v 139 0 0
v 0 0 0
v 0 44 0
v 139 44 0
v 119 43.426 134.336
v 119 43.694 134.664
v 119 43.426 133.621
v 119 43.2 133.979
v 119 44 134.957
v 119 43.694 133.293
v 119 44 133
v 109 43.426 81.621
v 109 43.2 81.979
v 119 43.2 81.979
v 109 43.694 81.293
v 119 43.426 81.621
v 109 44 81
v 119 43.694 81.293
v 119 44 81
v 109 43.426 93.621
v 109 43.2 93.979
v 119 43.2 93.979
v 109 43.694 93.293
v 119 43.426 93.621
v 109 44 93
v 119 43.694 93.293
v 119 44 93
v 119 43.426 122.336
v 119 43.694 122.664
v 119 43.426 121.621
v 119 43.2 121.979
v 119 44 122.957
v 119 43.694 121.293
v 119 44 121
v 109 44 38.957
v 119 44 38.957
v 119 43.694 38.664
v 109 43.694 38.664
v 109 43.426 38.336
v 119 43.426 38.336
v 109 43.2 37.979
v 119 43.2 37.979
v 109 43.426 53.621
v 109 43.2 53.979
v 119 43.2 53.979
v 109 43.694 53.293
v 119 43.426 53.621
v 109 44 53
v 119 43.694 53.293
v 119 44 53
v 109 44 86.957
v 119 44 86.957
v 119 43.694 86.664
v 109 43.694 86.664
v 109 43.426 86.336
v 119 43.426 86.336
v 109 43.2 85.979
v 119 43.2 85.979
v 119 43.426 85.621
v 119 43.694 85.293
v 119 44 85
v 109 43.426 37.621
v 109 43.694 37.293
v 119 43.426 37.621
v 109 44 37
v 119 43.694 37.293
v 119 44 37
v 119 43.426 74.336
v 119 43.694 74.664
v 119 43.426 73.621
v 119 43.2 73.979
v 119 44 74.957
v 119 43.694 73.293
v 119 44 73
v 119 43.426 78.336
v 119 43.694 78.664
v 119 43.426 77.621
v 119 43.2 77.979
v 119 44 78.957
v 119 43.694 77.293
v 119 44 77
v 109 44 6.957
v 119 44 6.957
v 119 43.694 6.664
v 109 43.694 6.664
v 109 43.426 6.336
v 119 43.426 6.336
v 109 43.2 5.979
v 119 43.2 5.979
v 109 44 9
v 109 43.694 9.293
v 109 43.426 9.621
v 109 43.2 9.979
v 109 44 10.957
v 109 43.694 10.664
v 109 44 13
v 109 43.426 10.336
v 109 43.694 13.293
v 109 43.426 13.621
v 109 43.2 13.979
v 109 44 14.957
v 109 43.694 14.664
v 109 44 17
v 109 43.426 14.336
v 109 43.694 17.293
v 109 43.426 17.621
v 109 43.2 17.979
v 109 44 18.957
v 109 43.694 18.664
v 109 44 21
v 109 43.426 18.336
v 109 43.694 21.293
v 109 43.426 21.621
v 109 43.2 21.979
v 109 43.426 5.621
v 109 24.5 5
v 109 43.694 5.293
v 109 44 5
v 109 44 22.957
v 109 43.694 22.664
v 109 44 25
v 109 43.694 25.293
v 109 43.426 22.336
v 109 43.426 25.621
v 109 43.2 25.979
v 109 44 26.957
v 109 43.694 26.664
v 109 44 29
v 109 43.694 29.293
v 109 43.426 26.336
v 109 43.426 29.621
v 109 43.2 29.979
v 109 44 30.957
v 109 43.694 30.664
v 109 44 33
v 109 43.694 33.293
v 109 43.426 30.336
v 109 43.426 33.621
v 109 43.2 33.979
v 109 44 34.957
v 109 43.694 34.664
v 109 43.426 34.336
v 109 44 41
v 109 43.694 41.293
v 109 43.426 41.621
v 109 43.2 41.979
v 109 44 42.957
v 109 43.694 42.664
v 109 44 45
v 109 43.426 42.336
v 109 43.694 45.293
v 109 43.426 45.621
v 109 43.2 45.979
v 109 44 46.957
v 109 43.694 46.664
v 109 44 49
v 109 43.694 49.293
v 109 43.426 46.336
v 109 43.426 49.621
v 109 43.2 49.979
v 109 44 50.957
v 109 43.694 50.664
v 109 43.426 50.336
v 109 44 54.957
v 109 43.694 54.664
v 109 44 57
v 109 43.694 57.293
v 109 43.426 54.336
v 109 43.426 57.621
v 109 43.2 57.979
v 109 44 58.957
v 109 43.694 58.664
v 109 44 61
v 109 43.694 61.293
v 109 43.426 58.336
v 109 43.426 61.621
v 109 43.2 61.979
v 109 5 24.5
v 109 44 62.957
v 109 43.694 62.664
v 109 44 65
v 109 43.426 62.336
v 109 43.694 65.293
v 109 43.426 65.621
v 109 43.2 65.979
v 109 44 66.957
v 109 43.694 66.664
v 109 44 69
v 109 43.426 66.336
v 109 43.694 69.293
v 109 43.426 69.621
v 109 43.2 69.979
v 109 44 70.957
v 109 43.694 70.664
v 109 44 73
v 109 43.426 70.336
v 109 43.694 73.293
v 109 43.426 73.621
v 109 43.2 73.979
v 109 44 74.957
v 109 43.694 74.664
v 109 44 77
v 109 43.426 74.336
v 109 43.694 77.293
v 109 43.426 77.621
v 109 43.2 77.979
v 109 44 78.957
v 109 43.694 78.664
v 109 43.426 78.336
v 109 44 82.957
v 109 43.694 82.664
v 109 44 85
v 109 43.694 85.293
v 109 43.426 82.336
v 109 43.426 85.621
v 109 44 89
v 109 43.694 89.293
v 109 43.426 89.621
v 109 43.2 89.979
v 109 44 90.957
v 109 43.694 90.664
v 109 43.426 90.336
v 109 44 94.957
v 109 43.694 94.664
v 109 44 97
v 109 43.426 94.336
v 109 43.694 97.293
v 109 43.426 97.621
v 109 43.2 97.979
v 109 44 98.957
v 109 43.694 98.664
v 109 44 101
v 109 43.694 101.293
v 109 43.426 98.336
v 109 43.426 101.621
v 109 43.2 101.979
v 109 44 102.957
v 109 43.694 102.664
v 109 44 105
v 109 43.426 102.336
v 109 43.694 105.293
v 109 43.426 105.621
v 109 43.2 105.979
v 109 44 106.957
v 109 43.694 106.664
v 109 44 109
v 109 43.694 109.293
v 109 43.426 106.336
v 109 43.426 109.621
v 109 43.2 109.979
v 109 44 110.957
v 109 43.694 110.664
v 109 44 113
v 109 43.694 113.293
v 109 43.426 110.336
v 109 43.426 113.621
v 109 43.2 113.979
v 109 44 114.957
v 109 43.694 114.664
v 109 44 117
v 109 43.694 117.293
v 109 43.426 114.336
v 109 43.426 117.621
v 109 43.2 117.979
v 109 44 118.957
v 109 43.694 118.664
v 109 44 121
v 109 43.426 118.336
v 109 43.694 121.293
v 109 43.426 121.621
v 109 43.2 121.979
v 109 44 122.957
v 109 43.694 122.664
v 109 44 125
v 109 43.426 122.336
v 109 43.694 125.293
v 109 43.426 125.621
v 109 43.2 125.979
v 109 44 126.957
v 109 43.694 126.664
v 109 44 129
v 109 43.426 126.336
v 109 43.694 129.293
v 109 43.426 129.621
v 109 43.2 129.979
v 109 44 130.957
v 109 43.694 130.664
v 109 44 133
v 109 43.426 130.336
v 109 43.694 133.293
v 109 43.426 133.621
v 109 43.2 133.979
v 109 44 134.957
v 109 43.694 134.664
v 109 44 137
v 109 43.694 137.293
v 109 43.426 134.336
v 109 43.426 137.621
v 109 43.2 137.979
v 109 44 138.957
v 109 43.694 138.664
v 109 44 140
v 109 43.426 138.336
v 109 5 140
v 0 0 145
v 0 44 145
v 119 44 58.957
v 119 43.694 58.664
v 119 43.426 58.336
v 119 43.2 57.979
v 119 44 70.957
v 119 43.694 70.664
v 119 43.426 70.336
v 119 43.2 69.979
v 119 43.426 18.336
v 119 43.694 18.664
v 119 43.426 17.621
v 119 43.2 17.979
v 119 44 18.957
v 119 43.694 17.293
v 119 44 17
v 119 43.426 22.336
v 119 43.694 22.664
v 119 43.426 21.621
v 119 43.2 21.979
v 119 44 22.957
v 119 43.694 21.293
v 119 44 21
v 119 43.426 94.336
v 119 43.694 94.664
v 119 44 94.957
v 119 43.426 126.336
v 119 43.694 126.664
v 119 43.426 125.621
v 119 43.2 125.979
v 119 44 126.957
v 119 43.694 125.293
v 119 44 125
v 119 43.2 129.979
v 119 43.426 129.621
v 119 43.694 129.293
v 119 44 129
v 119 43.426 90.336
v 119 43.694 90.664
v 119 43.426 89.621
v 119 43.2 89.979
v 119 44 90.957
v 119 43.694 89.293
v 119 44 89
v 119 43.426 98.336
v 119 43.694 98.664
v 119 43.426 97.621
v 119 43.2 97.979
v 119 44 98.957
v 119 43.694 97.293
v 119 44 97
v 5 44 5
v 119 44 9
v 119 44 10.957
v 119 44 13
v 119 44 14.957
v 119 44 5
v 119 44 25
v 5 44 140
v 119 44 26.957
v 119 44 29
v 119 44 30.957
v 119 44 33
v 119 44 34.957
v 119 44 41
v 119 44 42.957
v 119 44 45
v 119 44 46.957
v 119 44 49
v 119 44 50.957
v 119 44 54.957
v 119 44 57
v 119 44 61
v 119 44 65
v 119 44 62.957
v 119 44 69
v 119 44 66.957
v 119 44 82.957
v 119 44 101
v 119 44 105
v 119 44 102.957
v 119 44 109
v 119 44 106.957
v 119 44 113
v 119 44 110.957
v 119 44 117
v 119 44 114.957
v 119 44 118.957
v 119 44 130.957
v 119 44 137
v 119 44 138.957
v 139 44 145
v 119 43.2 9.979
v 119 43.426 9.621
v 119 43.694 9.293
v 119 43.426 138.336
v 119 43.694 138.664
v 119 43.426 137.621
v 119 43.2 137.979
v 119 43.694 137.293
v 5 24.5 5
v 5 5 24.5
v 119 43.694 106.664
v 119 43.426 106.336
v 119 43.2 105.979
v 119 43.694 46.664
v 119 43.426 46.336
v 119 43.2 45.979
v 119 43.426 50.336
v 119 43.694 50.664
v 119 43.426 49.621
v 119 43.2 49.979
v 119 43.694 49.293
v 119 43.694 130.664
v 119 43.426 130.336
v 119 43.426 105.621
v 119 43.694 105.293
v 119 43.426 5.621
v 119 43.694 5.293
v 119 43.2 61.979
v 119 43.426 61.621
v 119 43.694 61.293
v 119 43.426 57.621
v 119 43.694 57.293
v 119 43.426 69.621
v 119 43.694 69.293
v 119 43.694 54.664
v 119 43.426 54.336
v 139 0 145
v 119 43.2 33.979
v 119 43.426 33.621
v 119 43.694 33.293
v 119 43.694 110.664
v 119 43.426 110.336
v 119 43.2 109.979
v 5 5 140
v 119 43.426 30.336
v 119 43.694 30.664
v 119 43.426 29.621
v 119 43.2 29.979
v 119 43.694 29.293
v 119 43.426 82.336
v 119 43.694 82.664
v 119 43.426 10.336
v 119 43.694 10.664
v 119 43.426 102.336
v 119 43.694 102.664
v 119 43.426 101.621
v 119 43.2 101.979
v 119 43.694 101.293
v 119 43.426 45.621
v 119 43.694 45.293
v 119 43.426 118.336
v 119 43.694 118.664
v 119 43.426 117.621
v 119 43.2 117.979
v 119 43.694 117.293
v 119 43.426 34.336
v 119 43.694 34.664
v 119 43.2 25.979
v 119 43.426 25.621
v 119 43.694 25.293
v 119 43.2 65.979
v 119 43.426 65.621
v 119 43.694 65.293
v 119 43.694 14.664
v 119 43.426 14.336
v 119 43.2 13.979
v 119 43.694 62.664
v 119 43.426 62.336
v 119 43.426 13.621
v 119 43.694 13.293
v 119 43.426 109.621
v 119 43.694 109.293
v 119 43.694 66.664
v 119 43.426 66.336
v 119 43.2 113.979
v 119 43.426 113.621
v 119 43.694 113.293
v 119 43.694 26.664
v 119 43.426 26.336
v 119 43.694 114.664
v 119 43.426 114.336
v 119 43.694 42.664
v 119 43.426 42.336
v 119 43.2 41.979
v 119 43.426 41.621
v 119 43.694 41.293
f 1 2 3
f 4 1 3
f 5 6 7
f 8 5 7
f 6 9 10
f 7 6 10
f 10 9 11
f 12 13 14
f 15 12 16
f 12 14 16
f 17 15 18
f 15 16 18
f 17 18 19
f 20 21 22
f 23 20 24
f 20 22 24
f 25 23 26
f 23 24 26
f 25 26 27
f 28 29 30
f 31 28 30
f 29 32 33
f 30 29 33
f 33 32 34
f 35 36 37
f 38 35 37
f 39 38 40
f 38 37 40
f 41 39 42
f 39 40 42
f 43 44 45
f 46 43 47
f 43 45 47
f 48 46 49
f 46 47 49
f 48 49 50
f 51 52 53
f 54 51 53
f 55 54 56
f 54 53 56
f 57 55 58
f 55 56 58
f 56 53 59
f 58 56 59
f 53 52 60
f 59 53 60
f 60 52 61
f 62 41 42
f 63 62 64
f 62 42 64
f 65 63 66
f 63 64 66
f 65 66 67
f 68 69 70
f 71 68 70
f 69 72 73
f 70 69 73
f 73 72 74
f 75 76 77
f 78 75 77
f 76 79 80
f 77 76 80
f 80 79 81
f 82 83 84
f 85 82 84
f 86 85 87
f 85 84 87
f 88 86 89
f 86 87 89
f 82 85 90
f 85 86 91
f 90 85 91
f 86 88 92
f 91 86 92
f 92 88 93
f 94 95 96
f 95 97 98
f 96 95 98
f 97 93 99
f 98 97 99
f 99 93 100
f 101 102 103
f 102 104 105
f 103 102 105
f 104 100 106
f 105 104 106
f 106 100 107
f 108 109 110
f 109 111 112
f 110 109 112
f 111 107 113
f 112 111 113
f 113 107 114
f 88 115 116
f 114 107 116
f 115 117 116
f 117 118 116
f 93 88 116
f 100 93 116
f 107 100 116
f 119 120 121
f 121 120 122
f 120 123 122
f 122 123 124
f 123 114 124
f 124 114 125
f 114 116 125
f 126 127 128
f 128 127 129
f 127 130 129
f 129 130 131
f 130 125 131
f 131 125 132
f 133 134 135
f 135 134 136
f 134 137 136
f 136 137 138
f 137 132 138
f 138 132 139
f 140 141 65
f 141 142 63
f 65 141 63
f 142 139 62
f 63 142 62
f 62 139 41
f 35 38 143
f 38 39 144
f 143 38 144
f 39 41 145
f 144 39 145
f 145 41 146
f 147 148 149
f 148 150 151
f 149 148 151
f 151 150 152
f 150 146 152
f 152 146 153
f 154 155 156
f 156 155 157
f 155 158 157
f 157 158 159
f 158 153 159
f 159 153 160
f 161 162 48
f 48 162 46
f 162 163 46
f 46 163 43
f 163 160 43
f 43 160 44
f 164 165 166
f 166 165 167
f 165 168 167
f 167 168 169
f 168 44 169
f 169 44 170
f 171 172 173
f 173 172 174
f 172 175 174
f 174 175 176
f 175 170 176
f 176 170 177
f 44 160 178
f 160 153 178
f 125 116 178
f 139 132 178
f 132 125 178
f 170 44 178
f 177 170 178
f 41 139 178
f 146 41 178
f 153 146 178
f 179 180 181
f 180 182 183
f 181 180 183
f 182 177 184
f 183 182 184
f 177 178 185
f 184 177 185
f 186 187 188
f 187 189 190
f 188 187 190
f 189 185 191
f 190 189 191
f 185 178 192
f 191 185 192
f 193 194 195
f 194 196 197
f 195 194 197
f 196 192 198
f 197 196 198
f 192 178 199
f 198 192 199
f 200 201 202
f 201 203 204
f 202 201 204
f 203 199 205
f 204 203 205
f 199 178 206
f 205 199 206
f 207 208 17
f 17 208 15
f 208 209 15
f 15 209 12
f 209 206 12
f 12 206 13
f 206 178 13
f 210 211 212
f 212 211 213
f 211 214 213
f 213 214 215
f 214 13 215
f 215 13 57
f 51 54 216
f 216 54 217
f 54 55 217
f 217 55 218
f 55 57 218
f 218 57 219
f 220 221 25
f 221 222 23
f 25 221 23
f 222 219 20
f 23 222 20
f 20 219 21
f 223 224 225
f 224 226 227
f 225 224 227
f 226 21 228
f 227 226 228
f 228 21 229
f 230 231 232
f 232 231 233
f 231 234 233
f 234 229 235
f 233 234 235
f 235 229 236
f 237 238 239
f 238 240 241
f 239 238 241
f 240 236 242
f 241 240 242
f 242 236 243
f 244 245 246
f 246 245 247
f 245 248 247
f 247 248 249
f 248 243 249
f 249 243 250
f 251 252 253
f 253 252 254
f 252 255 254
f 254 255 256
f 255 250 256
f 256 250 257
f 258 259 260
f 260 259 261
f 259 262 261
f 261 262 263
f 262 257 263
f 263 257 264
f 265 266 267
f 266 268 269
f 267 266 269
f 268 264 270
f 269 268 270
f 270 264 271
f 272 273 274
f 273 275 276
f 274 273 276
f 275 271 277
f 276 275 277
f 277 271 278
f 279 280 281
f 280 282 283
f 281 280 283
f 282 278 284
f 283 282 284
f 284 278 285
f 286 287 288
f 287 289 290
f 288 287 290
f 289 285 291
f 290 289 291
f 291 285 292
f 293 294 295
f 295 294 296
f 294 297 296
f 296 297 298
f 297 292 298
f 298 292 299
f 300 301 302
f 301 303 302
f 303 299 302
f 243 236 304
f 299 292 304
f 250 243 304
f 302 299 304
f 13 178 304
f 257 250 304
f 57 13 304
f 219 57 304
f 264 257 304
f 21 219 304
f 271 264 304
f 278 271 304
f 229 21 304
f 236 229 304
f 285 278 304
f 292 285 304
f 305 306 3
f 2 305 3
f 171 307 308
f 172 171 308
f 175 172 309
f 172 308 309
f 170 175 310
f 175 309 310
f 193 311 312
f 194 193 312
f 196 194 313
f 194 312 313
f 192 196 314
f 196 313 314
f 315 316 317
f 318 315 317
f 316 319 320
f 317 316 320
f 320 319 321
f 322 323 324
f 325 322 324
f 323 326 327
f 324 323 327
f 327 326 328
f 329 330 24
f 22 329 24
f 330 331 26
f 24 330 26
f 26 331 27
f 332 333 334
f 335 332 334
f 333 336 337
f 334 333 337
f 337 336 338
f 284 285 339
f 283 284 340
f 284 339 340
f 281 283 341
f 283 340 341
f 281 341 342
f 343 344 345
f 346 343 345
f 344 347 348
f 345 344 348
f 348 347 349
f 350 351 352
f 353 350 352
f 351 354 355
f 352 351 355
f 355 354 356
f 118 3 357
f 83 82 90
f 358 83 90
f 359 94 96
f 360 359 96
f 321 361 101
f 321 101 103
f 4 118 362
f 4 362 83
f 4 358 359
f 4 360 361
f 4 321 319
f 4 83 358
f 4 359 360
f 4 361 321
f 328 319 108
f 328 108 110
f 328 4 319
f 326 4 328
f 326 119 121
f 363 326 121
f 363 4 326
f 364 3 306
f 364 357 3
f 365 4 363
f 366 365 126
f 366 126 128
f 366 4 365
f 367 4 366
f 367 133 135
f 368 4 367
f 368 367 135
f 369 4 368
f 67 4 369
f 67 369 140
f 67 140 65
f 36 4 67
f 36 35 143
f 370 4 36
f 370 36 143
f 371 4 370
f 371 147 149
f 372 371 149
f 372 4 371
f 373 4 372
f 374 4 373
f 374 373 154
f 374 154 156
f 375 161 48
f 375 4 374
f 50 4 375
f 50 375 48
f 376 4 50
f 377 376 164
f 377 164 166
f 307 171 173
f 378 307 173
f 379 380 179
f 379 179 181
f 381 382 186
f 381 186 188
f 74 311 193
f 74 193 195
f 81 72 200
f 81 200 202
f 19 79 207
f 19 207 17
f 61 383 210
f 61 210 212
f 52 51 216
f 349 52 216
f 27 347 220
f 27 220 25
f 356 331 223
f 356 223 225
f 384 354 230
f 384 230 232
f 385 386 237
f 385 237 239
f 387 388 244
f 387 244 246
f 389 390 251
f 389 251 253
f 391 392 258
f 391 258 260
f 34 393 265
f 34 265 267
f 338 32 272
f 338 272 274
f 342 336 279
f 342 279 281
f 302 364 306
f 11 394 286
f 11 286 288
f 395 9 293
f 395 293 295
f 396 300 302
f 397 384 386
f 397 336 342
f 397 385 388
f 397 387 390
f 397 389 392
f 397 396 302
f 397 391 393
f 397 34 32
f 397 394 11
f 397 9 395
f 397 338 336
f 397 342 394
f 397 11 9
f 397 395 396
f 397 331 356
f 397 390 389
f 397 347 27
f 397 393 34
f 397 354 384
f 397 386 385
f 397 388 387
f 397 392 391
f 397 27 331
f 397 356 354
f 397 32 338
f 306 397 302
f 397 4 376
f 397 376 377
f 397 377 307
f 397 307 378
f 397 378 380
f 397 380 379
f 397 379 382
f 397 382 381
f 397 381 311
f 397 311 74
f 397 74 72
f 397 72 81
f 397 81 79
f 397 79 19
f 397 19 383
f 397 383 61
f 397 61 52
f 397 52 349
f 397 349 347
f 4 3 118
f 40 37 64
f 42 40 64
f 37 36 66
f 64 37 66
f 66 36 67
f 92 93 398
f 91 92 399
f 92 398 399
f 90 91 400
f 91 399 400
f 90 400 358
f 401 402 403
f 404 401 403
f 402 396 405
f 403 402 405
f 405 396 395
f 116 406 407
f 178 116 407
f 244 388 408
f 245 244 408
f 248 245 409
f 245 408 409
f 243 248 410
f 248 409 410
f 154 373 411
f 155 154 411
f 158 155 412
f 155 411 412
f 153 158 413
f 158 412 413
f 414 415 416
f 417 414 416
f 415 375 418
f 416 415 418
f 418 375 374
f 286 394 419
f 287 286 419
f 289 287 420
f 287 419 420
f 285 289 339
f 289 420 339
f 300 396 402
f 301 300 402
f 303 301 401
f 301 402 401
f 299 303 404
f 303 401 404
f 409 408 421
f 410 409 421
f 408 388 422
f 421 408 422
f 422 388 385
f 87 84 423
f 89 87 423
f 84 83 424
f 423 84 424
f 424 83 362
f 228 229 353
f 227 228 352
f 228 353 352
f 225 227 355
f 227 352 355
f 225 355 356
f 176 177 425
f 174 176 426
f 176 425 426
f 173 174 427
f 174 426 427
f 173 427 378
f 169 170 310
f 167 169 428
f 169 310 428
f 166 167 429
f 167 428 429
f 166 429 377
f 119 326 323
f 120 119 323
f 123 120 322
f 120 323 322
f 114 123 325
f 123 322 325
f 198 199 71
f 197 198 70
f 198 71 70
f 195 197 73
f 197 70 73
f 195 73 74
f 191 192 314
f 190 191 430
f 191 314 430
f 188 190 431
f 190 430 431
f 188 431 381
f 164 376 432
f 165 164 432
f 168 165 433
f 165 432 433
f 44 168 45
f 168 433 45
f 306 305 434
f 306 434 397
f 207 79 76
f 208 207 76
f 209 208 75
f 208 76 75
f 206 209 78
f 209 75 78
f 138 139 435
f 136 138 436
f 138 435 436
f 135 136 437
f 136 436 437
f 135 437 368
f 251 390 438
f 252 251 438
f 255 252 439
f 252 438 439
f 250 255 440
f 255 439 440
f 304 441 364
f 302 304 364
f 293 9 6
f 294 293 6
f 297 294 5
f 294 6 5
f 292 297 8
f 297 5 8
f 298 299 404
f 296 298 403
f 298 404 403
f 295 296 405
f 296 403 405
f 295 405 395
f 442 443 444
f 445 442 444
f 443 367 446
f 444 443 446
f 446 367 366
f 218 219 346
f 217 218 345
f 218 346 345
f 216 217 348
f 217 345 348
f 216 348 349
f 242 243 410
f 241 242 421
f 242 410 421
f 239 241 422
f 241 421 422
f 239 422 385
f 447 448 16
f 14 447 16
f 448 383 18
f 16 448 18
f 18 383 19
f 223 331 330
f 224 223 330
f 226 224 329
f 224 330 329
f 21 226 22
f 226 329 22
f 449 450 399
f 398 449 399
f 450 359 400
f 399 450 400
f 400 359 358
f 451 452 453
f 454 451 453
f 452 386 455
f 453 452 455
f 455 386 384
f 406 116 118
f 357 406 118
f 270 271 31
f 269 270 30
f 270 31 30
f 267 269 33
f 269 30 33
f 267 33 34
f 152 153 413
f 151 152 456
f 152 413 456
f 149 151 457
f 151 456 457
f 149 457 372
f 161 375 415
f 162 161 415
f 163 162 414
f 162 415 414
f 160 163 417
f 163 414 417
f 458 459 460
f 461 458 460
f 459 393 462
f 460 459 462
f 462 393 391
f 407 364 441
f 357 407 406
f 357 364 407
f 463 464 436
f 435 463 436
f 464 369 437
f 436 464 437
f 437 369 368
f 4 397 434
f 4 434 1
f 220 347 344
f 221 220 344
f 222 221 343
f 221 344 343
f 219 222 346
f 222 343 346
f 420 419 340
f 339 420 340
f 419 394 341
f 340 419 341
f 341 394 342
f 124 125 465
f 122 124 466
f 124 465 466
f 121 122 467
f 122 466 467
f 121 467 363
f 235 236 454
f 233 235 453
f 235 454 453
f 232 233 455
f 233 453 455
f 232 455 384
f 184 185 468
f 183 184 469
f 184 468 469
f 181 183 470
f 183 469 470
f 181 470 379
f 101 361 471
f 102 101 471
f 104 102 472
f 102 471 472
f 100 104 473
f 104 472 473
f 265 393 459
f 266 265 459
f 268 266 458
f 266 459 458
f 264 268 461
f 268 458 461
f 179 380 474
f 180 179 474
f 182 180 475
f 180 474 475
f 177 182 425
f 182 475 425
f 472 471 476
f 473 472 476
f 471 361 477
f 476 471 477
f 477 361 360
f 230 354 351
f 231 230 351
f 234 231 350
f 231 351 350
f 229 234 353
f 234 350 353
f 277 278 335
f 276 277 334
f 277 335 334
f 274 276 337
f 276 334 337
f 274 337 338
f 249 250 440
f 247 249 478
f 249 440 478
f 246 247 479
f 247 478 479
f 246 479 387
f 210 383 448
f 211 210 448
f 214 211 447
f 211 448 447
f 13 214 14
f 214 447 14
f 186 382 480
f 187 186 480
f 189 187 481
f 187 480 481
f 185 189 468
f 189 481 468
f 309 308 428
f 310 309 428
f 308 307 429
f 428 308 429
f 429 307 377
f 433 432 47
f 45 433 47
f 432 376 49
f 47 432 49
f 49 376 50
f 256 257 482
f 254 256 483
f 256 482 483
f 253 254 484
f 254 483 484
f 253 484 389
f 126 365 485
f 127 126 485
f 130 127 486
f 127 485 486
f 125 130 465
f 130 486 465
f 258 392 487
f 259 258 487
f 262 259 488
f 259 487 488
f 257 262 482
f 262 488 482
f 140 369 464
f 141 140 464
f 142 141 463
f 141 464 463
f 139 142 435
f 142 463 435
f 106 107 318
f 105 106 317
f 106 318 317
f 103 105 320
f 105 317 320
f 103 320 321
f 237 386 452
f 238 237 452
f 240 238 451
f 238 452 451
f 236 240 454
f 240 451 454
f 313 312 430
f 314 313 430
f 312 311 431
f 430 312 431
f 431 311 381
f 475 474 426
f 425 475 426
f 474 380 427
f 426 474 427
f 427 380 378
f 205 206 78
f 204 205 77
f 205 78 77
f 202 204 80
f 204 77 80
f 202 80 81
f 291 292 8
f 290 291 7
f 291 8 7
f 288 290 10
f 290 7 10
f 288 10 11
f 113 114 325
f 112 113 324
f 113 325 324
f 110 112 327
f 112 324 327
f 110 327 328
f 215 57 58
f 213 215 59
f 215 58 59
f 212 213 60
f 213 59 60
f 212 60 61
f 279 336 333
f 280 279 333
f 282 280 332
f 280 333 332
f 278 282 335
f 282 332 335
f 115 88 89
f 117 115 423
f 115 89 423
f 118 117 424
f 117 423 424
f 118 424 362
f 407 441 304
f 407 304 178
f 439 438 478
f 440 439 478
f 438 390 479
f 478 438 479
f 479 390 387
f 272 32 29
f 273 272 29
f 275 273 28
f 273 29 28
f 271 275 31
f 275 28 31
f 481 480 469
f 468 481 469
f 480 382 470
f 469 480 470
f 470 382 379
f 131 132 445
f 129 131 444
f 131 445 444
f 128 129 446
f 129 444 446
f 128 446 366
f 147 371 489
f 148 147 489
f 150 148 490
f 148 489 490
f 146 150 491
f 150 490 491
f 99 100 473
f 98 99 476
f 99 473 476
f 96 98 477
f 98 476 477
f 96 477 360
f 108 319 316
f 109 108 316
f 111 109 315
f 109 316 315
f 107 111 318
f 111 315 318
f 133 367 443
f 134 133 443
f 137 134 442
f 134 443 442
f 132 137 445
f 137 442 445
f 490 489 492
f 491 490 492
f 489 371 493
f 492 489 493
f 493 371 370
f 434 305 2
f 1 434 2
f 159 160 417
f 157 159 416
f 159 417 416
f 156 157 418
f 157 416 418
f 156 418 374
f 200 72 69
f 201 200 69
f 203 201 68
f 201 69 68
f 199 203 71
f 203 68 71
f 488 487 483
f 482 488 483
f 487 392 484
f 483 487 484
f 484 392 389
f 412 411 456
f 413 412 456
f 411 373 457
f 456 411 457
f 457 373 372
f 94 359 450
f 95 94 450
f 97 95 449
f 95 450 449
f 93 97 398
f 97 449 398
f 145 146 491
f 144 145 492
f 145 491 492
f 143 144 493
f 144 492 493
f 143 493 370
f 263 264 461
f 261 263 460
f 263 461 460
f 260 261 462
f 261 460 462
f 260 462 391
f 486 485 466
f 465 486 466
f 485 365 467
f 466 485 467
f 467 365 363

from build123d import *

# Parameters (mm, degrees)
SKETCH_1_W                 = 145
SKETCH_1_H                 = 44
EXTRUDE_1_DEPTH            = 139
SHELL_1_T                  = -5
SHELL_1_THICKNESS_2_FACE_W = 135
SHELL_1_THICKNESS_2_FACE_H = 39
SHELL_1_THICKNESS_2_DEPTH  = 25
EXTRUDE_2_REACH            = 204.28
CUT_EXTRUDE_START          = -10
CUT_EXTRUDE_1_DEPTH        = 10
PATTERN_LINEAR_2_COUNT     = 34
PATTERN_LINEAR_2_PITCH     = 4


with BuildPart() as part:
    # 스케치1 → 보스-돌출1 (new body)
    with BuildSketch(Plane(origin=(0, 0, 0), x_dir=(0, 0, -1), z_dir=(1, 0, 0))):
        with Locations((-72.5, 22)):
            Rectangle(SKETCH_1_W, SKETCH_1_H)
    extrude(amount=EXTRUDE_1_DEPTH)

    # 쉘1
    shell_1_openings = [part.faces().sort_by_distance(p)[0] for p in [
        (69.5, 44, 72.5),
    ]]
    offset(amount=SHELL_1_T, openings=shell_1_openings, kind=Kind.INTERSECTION)

    # 쉘1 thickness 2 face (on inner face of the shell) → 쉘1 thickness 2 (add)
    with BuildSketch(Plane(origin=(134, 24.5, 72.5), x_dir=(0, 0, 1), z_dir=(1, 0, 0))):
        Rectangle(SHELL_1_THICKNESS_2_FACE_W, SHELL_1_THICKNESS_2_FACE_H)
    extrude(amount=-SHELL_1_THICKNESS_2_DEPTH)

    # 스케치3 → 보스-돌출2 (add, up to next)
    with BuildSketch(Plane(origin=(5, 0, 0), x_dir=(0, 0, -1), z_dir=(1, 0, 0)), mode=Mode.PRIVATE) as extrude_2_sk1:
        Polygon((-5, 24.5), (-24.5, 5), (-5, 5), align=None)
    extrude_2_tool1 = extrude(extrude_2_sk1.sketch, amount=EXTRUDE_2_REACH, mode=Mode.PRIVATE) - part.part
    add(extrude_2_tool1.solids().sort_by_distance((5, 11.5, 11.5))[0])

    # 스케치4 → 컷-돌출1 (cut)
    with BuildSketch(Plane.ZY.offset(-109).offset(CUT_EXTRUDE_START)):
        with BuildLine():
            Line((4.168052643, 46.265280356), (7.789262128, 46.265280356))
            ThreePointArc((7.789262128, 46.265280356), (7.302805176, 44.485235891), (5.978657386, 43.2))
            ThreePointArc((5.978657386, 43.2), (4.654509595, 44.485235891), (4.168052643, 46.265280356))
        make_face()
    cut_extrude_1 = extrude(amount=CUT_EXTRUDE_1_DEPTH, mode=Mode.SUBTRACT)

    # 선형 패턴2: 컷-돌출1 ×34
    with Locations(*[(0, 0, i * PATTERN_LINEAR_2_PITCH) for i in range(1, PATTERN_LINEAR_2_COUNT)]):
        add(cut_extrude_1, mode=Mode.SUBTRACT)


solid = part.part
